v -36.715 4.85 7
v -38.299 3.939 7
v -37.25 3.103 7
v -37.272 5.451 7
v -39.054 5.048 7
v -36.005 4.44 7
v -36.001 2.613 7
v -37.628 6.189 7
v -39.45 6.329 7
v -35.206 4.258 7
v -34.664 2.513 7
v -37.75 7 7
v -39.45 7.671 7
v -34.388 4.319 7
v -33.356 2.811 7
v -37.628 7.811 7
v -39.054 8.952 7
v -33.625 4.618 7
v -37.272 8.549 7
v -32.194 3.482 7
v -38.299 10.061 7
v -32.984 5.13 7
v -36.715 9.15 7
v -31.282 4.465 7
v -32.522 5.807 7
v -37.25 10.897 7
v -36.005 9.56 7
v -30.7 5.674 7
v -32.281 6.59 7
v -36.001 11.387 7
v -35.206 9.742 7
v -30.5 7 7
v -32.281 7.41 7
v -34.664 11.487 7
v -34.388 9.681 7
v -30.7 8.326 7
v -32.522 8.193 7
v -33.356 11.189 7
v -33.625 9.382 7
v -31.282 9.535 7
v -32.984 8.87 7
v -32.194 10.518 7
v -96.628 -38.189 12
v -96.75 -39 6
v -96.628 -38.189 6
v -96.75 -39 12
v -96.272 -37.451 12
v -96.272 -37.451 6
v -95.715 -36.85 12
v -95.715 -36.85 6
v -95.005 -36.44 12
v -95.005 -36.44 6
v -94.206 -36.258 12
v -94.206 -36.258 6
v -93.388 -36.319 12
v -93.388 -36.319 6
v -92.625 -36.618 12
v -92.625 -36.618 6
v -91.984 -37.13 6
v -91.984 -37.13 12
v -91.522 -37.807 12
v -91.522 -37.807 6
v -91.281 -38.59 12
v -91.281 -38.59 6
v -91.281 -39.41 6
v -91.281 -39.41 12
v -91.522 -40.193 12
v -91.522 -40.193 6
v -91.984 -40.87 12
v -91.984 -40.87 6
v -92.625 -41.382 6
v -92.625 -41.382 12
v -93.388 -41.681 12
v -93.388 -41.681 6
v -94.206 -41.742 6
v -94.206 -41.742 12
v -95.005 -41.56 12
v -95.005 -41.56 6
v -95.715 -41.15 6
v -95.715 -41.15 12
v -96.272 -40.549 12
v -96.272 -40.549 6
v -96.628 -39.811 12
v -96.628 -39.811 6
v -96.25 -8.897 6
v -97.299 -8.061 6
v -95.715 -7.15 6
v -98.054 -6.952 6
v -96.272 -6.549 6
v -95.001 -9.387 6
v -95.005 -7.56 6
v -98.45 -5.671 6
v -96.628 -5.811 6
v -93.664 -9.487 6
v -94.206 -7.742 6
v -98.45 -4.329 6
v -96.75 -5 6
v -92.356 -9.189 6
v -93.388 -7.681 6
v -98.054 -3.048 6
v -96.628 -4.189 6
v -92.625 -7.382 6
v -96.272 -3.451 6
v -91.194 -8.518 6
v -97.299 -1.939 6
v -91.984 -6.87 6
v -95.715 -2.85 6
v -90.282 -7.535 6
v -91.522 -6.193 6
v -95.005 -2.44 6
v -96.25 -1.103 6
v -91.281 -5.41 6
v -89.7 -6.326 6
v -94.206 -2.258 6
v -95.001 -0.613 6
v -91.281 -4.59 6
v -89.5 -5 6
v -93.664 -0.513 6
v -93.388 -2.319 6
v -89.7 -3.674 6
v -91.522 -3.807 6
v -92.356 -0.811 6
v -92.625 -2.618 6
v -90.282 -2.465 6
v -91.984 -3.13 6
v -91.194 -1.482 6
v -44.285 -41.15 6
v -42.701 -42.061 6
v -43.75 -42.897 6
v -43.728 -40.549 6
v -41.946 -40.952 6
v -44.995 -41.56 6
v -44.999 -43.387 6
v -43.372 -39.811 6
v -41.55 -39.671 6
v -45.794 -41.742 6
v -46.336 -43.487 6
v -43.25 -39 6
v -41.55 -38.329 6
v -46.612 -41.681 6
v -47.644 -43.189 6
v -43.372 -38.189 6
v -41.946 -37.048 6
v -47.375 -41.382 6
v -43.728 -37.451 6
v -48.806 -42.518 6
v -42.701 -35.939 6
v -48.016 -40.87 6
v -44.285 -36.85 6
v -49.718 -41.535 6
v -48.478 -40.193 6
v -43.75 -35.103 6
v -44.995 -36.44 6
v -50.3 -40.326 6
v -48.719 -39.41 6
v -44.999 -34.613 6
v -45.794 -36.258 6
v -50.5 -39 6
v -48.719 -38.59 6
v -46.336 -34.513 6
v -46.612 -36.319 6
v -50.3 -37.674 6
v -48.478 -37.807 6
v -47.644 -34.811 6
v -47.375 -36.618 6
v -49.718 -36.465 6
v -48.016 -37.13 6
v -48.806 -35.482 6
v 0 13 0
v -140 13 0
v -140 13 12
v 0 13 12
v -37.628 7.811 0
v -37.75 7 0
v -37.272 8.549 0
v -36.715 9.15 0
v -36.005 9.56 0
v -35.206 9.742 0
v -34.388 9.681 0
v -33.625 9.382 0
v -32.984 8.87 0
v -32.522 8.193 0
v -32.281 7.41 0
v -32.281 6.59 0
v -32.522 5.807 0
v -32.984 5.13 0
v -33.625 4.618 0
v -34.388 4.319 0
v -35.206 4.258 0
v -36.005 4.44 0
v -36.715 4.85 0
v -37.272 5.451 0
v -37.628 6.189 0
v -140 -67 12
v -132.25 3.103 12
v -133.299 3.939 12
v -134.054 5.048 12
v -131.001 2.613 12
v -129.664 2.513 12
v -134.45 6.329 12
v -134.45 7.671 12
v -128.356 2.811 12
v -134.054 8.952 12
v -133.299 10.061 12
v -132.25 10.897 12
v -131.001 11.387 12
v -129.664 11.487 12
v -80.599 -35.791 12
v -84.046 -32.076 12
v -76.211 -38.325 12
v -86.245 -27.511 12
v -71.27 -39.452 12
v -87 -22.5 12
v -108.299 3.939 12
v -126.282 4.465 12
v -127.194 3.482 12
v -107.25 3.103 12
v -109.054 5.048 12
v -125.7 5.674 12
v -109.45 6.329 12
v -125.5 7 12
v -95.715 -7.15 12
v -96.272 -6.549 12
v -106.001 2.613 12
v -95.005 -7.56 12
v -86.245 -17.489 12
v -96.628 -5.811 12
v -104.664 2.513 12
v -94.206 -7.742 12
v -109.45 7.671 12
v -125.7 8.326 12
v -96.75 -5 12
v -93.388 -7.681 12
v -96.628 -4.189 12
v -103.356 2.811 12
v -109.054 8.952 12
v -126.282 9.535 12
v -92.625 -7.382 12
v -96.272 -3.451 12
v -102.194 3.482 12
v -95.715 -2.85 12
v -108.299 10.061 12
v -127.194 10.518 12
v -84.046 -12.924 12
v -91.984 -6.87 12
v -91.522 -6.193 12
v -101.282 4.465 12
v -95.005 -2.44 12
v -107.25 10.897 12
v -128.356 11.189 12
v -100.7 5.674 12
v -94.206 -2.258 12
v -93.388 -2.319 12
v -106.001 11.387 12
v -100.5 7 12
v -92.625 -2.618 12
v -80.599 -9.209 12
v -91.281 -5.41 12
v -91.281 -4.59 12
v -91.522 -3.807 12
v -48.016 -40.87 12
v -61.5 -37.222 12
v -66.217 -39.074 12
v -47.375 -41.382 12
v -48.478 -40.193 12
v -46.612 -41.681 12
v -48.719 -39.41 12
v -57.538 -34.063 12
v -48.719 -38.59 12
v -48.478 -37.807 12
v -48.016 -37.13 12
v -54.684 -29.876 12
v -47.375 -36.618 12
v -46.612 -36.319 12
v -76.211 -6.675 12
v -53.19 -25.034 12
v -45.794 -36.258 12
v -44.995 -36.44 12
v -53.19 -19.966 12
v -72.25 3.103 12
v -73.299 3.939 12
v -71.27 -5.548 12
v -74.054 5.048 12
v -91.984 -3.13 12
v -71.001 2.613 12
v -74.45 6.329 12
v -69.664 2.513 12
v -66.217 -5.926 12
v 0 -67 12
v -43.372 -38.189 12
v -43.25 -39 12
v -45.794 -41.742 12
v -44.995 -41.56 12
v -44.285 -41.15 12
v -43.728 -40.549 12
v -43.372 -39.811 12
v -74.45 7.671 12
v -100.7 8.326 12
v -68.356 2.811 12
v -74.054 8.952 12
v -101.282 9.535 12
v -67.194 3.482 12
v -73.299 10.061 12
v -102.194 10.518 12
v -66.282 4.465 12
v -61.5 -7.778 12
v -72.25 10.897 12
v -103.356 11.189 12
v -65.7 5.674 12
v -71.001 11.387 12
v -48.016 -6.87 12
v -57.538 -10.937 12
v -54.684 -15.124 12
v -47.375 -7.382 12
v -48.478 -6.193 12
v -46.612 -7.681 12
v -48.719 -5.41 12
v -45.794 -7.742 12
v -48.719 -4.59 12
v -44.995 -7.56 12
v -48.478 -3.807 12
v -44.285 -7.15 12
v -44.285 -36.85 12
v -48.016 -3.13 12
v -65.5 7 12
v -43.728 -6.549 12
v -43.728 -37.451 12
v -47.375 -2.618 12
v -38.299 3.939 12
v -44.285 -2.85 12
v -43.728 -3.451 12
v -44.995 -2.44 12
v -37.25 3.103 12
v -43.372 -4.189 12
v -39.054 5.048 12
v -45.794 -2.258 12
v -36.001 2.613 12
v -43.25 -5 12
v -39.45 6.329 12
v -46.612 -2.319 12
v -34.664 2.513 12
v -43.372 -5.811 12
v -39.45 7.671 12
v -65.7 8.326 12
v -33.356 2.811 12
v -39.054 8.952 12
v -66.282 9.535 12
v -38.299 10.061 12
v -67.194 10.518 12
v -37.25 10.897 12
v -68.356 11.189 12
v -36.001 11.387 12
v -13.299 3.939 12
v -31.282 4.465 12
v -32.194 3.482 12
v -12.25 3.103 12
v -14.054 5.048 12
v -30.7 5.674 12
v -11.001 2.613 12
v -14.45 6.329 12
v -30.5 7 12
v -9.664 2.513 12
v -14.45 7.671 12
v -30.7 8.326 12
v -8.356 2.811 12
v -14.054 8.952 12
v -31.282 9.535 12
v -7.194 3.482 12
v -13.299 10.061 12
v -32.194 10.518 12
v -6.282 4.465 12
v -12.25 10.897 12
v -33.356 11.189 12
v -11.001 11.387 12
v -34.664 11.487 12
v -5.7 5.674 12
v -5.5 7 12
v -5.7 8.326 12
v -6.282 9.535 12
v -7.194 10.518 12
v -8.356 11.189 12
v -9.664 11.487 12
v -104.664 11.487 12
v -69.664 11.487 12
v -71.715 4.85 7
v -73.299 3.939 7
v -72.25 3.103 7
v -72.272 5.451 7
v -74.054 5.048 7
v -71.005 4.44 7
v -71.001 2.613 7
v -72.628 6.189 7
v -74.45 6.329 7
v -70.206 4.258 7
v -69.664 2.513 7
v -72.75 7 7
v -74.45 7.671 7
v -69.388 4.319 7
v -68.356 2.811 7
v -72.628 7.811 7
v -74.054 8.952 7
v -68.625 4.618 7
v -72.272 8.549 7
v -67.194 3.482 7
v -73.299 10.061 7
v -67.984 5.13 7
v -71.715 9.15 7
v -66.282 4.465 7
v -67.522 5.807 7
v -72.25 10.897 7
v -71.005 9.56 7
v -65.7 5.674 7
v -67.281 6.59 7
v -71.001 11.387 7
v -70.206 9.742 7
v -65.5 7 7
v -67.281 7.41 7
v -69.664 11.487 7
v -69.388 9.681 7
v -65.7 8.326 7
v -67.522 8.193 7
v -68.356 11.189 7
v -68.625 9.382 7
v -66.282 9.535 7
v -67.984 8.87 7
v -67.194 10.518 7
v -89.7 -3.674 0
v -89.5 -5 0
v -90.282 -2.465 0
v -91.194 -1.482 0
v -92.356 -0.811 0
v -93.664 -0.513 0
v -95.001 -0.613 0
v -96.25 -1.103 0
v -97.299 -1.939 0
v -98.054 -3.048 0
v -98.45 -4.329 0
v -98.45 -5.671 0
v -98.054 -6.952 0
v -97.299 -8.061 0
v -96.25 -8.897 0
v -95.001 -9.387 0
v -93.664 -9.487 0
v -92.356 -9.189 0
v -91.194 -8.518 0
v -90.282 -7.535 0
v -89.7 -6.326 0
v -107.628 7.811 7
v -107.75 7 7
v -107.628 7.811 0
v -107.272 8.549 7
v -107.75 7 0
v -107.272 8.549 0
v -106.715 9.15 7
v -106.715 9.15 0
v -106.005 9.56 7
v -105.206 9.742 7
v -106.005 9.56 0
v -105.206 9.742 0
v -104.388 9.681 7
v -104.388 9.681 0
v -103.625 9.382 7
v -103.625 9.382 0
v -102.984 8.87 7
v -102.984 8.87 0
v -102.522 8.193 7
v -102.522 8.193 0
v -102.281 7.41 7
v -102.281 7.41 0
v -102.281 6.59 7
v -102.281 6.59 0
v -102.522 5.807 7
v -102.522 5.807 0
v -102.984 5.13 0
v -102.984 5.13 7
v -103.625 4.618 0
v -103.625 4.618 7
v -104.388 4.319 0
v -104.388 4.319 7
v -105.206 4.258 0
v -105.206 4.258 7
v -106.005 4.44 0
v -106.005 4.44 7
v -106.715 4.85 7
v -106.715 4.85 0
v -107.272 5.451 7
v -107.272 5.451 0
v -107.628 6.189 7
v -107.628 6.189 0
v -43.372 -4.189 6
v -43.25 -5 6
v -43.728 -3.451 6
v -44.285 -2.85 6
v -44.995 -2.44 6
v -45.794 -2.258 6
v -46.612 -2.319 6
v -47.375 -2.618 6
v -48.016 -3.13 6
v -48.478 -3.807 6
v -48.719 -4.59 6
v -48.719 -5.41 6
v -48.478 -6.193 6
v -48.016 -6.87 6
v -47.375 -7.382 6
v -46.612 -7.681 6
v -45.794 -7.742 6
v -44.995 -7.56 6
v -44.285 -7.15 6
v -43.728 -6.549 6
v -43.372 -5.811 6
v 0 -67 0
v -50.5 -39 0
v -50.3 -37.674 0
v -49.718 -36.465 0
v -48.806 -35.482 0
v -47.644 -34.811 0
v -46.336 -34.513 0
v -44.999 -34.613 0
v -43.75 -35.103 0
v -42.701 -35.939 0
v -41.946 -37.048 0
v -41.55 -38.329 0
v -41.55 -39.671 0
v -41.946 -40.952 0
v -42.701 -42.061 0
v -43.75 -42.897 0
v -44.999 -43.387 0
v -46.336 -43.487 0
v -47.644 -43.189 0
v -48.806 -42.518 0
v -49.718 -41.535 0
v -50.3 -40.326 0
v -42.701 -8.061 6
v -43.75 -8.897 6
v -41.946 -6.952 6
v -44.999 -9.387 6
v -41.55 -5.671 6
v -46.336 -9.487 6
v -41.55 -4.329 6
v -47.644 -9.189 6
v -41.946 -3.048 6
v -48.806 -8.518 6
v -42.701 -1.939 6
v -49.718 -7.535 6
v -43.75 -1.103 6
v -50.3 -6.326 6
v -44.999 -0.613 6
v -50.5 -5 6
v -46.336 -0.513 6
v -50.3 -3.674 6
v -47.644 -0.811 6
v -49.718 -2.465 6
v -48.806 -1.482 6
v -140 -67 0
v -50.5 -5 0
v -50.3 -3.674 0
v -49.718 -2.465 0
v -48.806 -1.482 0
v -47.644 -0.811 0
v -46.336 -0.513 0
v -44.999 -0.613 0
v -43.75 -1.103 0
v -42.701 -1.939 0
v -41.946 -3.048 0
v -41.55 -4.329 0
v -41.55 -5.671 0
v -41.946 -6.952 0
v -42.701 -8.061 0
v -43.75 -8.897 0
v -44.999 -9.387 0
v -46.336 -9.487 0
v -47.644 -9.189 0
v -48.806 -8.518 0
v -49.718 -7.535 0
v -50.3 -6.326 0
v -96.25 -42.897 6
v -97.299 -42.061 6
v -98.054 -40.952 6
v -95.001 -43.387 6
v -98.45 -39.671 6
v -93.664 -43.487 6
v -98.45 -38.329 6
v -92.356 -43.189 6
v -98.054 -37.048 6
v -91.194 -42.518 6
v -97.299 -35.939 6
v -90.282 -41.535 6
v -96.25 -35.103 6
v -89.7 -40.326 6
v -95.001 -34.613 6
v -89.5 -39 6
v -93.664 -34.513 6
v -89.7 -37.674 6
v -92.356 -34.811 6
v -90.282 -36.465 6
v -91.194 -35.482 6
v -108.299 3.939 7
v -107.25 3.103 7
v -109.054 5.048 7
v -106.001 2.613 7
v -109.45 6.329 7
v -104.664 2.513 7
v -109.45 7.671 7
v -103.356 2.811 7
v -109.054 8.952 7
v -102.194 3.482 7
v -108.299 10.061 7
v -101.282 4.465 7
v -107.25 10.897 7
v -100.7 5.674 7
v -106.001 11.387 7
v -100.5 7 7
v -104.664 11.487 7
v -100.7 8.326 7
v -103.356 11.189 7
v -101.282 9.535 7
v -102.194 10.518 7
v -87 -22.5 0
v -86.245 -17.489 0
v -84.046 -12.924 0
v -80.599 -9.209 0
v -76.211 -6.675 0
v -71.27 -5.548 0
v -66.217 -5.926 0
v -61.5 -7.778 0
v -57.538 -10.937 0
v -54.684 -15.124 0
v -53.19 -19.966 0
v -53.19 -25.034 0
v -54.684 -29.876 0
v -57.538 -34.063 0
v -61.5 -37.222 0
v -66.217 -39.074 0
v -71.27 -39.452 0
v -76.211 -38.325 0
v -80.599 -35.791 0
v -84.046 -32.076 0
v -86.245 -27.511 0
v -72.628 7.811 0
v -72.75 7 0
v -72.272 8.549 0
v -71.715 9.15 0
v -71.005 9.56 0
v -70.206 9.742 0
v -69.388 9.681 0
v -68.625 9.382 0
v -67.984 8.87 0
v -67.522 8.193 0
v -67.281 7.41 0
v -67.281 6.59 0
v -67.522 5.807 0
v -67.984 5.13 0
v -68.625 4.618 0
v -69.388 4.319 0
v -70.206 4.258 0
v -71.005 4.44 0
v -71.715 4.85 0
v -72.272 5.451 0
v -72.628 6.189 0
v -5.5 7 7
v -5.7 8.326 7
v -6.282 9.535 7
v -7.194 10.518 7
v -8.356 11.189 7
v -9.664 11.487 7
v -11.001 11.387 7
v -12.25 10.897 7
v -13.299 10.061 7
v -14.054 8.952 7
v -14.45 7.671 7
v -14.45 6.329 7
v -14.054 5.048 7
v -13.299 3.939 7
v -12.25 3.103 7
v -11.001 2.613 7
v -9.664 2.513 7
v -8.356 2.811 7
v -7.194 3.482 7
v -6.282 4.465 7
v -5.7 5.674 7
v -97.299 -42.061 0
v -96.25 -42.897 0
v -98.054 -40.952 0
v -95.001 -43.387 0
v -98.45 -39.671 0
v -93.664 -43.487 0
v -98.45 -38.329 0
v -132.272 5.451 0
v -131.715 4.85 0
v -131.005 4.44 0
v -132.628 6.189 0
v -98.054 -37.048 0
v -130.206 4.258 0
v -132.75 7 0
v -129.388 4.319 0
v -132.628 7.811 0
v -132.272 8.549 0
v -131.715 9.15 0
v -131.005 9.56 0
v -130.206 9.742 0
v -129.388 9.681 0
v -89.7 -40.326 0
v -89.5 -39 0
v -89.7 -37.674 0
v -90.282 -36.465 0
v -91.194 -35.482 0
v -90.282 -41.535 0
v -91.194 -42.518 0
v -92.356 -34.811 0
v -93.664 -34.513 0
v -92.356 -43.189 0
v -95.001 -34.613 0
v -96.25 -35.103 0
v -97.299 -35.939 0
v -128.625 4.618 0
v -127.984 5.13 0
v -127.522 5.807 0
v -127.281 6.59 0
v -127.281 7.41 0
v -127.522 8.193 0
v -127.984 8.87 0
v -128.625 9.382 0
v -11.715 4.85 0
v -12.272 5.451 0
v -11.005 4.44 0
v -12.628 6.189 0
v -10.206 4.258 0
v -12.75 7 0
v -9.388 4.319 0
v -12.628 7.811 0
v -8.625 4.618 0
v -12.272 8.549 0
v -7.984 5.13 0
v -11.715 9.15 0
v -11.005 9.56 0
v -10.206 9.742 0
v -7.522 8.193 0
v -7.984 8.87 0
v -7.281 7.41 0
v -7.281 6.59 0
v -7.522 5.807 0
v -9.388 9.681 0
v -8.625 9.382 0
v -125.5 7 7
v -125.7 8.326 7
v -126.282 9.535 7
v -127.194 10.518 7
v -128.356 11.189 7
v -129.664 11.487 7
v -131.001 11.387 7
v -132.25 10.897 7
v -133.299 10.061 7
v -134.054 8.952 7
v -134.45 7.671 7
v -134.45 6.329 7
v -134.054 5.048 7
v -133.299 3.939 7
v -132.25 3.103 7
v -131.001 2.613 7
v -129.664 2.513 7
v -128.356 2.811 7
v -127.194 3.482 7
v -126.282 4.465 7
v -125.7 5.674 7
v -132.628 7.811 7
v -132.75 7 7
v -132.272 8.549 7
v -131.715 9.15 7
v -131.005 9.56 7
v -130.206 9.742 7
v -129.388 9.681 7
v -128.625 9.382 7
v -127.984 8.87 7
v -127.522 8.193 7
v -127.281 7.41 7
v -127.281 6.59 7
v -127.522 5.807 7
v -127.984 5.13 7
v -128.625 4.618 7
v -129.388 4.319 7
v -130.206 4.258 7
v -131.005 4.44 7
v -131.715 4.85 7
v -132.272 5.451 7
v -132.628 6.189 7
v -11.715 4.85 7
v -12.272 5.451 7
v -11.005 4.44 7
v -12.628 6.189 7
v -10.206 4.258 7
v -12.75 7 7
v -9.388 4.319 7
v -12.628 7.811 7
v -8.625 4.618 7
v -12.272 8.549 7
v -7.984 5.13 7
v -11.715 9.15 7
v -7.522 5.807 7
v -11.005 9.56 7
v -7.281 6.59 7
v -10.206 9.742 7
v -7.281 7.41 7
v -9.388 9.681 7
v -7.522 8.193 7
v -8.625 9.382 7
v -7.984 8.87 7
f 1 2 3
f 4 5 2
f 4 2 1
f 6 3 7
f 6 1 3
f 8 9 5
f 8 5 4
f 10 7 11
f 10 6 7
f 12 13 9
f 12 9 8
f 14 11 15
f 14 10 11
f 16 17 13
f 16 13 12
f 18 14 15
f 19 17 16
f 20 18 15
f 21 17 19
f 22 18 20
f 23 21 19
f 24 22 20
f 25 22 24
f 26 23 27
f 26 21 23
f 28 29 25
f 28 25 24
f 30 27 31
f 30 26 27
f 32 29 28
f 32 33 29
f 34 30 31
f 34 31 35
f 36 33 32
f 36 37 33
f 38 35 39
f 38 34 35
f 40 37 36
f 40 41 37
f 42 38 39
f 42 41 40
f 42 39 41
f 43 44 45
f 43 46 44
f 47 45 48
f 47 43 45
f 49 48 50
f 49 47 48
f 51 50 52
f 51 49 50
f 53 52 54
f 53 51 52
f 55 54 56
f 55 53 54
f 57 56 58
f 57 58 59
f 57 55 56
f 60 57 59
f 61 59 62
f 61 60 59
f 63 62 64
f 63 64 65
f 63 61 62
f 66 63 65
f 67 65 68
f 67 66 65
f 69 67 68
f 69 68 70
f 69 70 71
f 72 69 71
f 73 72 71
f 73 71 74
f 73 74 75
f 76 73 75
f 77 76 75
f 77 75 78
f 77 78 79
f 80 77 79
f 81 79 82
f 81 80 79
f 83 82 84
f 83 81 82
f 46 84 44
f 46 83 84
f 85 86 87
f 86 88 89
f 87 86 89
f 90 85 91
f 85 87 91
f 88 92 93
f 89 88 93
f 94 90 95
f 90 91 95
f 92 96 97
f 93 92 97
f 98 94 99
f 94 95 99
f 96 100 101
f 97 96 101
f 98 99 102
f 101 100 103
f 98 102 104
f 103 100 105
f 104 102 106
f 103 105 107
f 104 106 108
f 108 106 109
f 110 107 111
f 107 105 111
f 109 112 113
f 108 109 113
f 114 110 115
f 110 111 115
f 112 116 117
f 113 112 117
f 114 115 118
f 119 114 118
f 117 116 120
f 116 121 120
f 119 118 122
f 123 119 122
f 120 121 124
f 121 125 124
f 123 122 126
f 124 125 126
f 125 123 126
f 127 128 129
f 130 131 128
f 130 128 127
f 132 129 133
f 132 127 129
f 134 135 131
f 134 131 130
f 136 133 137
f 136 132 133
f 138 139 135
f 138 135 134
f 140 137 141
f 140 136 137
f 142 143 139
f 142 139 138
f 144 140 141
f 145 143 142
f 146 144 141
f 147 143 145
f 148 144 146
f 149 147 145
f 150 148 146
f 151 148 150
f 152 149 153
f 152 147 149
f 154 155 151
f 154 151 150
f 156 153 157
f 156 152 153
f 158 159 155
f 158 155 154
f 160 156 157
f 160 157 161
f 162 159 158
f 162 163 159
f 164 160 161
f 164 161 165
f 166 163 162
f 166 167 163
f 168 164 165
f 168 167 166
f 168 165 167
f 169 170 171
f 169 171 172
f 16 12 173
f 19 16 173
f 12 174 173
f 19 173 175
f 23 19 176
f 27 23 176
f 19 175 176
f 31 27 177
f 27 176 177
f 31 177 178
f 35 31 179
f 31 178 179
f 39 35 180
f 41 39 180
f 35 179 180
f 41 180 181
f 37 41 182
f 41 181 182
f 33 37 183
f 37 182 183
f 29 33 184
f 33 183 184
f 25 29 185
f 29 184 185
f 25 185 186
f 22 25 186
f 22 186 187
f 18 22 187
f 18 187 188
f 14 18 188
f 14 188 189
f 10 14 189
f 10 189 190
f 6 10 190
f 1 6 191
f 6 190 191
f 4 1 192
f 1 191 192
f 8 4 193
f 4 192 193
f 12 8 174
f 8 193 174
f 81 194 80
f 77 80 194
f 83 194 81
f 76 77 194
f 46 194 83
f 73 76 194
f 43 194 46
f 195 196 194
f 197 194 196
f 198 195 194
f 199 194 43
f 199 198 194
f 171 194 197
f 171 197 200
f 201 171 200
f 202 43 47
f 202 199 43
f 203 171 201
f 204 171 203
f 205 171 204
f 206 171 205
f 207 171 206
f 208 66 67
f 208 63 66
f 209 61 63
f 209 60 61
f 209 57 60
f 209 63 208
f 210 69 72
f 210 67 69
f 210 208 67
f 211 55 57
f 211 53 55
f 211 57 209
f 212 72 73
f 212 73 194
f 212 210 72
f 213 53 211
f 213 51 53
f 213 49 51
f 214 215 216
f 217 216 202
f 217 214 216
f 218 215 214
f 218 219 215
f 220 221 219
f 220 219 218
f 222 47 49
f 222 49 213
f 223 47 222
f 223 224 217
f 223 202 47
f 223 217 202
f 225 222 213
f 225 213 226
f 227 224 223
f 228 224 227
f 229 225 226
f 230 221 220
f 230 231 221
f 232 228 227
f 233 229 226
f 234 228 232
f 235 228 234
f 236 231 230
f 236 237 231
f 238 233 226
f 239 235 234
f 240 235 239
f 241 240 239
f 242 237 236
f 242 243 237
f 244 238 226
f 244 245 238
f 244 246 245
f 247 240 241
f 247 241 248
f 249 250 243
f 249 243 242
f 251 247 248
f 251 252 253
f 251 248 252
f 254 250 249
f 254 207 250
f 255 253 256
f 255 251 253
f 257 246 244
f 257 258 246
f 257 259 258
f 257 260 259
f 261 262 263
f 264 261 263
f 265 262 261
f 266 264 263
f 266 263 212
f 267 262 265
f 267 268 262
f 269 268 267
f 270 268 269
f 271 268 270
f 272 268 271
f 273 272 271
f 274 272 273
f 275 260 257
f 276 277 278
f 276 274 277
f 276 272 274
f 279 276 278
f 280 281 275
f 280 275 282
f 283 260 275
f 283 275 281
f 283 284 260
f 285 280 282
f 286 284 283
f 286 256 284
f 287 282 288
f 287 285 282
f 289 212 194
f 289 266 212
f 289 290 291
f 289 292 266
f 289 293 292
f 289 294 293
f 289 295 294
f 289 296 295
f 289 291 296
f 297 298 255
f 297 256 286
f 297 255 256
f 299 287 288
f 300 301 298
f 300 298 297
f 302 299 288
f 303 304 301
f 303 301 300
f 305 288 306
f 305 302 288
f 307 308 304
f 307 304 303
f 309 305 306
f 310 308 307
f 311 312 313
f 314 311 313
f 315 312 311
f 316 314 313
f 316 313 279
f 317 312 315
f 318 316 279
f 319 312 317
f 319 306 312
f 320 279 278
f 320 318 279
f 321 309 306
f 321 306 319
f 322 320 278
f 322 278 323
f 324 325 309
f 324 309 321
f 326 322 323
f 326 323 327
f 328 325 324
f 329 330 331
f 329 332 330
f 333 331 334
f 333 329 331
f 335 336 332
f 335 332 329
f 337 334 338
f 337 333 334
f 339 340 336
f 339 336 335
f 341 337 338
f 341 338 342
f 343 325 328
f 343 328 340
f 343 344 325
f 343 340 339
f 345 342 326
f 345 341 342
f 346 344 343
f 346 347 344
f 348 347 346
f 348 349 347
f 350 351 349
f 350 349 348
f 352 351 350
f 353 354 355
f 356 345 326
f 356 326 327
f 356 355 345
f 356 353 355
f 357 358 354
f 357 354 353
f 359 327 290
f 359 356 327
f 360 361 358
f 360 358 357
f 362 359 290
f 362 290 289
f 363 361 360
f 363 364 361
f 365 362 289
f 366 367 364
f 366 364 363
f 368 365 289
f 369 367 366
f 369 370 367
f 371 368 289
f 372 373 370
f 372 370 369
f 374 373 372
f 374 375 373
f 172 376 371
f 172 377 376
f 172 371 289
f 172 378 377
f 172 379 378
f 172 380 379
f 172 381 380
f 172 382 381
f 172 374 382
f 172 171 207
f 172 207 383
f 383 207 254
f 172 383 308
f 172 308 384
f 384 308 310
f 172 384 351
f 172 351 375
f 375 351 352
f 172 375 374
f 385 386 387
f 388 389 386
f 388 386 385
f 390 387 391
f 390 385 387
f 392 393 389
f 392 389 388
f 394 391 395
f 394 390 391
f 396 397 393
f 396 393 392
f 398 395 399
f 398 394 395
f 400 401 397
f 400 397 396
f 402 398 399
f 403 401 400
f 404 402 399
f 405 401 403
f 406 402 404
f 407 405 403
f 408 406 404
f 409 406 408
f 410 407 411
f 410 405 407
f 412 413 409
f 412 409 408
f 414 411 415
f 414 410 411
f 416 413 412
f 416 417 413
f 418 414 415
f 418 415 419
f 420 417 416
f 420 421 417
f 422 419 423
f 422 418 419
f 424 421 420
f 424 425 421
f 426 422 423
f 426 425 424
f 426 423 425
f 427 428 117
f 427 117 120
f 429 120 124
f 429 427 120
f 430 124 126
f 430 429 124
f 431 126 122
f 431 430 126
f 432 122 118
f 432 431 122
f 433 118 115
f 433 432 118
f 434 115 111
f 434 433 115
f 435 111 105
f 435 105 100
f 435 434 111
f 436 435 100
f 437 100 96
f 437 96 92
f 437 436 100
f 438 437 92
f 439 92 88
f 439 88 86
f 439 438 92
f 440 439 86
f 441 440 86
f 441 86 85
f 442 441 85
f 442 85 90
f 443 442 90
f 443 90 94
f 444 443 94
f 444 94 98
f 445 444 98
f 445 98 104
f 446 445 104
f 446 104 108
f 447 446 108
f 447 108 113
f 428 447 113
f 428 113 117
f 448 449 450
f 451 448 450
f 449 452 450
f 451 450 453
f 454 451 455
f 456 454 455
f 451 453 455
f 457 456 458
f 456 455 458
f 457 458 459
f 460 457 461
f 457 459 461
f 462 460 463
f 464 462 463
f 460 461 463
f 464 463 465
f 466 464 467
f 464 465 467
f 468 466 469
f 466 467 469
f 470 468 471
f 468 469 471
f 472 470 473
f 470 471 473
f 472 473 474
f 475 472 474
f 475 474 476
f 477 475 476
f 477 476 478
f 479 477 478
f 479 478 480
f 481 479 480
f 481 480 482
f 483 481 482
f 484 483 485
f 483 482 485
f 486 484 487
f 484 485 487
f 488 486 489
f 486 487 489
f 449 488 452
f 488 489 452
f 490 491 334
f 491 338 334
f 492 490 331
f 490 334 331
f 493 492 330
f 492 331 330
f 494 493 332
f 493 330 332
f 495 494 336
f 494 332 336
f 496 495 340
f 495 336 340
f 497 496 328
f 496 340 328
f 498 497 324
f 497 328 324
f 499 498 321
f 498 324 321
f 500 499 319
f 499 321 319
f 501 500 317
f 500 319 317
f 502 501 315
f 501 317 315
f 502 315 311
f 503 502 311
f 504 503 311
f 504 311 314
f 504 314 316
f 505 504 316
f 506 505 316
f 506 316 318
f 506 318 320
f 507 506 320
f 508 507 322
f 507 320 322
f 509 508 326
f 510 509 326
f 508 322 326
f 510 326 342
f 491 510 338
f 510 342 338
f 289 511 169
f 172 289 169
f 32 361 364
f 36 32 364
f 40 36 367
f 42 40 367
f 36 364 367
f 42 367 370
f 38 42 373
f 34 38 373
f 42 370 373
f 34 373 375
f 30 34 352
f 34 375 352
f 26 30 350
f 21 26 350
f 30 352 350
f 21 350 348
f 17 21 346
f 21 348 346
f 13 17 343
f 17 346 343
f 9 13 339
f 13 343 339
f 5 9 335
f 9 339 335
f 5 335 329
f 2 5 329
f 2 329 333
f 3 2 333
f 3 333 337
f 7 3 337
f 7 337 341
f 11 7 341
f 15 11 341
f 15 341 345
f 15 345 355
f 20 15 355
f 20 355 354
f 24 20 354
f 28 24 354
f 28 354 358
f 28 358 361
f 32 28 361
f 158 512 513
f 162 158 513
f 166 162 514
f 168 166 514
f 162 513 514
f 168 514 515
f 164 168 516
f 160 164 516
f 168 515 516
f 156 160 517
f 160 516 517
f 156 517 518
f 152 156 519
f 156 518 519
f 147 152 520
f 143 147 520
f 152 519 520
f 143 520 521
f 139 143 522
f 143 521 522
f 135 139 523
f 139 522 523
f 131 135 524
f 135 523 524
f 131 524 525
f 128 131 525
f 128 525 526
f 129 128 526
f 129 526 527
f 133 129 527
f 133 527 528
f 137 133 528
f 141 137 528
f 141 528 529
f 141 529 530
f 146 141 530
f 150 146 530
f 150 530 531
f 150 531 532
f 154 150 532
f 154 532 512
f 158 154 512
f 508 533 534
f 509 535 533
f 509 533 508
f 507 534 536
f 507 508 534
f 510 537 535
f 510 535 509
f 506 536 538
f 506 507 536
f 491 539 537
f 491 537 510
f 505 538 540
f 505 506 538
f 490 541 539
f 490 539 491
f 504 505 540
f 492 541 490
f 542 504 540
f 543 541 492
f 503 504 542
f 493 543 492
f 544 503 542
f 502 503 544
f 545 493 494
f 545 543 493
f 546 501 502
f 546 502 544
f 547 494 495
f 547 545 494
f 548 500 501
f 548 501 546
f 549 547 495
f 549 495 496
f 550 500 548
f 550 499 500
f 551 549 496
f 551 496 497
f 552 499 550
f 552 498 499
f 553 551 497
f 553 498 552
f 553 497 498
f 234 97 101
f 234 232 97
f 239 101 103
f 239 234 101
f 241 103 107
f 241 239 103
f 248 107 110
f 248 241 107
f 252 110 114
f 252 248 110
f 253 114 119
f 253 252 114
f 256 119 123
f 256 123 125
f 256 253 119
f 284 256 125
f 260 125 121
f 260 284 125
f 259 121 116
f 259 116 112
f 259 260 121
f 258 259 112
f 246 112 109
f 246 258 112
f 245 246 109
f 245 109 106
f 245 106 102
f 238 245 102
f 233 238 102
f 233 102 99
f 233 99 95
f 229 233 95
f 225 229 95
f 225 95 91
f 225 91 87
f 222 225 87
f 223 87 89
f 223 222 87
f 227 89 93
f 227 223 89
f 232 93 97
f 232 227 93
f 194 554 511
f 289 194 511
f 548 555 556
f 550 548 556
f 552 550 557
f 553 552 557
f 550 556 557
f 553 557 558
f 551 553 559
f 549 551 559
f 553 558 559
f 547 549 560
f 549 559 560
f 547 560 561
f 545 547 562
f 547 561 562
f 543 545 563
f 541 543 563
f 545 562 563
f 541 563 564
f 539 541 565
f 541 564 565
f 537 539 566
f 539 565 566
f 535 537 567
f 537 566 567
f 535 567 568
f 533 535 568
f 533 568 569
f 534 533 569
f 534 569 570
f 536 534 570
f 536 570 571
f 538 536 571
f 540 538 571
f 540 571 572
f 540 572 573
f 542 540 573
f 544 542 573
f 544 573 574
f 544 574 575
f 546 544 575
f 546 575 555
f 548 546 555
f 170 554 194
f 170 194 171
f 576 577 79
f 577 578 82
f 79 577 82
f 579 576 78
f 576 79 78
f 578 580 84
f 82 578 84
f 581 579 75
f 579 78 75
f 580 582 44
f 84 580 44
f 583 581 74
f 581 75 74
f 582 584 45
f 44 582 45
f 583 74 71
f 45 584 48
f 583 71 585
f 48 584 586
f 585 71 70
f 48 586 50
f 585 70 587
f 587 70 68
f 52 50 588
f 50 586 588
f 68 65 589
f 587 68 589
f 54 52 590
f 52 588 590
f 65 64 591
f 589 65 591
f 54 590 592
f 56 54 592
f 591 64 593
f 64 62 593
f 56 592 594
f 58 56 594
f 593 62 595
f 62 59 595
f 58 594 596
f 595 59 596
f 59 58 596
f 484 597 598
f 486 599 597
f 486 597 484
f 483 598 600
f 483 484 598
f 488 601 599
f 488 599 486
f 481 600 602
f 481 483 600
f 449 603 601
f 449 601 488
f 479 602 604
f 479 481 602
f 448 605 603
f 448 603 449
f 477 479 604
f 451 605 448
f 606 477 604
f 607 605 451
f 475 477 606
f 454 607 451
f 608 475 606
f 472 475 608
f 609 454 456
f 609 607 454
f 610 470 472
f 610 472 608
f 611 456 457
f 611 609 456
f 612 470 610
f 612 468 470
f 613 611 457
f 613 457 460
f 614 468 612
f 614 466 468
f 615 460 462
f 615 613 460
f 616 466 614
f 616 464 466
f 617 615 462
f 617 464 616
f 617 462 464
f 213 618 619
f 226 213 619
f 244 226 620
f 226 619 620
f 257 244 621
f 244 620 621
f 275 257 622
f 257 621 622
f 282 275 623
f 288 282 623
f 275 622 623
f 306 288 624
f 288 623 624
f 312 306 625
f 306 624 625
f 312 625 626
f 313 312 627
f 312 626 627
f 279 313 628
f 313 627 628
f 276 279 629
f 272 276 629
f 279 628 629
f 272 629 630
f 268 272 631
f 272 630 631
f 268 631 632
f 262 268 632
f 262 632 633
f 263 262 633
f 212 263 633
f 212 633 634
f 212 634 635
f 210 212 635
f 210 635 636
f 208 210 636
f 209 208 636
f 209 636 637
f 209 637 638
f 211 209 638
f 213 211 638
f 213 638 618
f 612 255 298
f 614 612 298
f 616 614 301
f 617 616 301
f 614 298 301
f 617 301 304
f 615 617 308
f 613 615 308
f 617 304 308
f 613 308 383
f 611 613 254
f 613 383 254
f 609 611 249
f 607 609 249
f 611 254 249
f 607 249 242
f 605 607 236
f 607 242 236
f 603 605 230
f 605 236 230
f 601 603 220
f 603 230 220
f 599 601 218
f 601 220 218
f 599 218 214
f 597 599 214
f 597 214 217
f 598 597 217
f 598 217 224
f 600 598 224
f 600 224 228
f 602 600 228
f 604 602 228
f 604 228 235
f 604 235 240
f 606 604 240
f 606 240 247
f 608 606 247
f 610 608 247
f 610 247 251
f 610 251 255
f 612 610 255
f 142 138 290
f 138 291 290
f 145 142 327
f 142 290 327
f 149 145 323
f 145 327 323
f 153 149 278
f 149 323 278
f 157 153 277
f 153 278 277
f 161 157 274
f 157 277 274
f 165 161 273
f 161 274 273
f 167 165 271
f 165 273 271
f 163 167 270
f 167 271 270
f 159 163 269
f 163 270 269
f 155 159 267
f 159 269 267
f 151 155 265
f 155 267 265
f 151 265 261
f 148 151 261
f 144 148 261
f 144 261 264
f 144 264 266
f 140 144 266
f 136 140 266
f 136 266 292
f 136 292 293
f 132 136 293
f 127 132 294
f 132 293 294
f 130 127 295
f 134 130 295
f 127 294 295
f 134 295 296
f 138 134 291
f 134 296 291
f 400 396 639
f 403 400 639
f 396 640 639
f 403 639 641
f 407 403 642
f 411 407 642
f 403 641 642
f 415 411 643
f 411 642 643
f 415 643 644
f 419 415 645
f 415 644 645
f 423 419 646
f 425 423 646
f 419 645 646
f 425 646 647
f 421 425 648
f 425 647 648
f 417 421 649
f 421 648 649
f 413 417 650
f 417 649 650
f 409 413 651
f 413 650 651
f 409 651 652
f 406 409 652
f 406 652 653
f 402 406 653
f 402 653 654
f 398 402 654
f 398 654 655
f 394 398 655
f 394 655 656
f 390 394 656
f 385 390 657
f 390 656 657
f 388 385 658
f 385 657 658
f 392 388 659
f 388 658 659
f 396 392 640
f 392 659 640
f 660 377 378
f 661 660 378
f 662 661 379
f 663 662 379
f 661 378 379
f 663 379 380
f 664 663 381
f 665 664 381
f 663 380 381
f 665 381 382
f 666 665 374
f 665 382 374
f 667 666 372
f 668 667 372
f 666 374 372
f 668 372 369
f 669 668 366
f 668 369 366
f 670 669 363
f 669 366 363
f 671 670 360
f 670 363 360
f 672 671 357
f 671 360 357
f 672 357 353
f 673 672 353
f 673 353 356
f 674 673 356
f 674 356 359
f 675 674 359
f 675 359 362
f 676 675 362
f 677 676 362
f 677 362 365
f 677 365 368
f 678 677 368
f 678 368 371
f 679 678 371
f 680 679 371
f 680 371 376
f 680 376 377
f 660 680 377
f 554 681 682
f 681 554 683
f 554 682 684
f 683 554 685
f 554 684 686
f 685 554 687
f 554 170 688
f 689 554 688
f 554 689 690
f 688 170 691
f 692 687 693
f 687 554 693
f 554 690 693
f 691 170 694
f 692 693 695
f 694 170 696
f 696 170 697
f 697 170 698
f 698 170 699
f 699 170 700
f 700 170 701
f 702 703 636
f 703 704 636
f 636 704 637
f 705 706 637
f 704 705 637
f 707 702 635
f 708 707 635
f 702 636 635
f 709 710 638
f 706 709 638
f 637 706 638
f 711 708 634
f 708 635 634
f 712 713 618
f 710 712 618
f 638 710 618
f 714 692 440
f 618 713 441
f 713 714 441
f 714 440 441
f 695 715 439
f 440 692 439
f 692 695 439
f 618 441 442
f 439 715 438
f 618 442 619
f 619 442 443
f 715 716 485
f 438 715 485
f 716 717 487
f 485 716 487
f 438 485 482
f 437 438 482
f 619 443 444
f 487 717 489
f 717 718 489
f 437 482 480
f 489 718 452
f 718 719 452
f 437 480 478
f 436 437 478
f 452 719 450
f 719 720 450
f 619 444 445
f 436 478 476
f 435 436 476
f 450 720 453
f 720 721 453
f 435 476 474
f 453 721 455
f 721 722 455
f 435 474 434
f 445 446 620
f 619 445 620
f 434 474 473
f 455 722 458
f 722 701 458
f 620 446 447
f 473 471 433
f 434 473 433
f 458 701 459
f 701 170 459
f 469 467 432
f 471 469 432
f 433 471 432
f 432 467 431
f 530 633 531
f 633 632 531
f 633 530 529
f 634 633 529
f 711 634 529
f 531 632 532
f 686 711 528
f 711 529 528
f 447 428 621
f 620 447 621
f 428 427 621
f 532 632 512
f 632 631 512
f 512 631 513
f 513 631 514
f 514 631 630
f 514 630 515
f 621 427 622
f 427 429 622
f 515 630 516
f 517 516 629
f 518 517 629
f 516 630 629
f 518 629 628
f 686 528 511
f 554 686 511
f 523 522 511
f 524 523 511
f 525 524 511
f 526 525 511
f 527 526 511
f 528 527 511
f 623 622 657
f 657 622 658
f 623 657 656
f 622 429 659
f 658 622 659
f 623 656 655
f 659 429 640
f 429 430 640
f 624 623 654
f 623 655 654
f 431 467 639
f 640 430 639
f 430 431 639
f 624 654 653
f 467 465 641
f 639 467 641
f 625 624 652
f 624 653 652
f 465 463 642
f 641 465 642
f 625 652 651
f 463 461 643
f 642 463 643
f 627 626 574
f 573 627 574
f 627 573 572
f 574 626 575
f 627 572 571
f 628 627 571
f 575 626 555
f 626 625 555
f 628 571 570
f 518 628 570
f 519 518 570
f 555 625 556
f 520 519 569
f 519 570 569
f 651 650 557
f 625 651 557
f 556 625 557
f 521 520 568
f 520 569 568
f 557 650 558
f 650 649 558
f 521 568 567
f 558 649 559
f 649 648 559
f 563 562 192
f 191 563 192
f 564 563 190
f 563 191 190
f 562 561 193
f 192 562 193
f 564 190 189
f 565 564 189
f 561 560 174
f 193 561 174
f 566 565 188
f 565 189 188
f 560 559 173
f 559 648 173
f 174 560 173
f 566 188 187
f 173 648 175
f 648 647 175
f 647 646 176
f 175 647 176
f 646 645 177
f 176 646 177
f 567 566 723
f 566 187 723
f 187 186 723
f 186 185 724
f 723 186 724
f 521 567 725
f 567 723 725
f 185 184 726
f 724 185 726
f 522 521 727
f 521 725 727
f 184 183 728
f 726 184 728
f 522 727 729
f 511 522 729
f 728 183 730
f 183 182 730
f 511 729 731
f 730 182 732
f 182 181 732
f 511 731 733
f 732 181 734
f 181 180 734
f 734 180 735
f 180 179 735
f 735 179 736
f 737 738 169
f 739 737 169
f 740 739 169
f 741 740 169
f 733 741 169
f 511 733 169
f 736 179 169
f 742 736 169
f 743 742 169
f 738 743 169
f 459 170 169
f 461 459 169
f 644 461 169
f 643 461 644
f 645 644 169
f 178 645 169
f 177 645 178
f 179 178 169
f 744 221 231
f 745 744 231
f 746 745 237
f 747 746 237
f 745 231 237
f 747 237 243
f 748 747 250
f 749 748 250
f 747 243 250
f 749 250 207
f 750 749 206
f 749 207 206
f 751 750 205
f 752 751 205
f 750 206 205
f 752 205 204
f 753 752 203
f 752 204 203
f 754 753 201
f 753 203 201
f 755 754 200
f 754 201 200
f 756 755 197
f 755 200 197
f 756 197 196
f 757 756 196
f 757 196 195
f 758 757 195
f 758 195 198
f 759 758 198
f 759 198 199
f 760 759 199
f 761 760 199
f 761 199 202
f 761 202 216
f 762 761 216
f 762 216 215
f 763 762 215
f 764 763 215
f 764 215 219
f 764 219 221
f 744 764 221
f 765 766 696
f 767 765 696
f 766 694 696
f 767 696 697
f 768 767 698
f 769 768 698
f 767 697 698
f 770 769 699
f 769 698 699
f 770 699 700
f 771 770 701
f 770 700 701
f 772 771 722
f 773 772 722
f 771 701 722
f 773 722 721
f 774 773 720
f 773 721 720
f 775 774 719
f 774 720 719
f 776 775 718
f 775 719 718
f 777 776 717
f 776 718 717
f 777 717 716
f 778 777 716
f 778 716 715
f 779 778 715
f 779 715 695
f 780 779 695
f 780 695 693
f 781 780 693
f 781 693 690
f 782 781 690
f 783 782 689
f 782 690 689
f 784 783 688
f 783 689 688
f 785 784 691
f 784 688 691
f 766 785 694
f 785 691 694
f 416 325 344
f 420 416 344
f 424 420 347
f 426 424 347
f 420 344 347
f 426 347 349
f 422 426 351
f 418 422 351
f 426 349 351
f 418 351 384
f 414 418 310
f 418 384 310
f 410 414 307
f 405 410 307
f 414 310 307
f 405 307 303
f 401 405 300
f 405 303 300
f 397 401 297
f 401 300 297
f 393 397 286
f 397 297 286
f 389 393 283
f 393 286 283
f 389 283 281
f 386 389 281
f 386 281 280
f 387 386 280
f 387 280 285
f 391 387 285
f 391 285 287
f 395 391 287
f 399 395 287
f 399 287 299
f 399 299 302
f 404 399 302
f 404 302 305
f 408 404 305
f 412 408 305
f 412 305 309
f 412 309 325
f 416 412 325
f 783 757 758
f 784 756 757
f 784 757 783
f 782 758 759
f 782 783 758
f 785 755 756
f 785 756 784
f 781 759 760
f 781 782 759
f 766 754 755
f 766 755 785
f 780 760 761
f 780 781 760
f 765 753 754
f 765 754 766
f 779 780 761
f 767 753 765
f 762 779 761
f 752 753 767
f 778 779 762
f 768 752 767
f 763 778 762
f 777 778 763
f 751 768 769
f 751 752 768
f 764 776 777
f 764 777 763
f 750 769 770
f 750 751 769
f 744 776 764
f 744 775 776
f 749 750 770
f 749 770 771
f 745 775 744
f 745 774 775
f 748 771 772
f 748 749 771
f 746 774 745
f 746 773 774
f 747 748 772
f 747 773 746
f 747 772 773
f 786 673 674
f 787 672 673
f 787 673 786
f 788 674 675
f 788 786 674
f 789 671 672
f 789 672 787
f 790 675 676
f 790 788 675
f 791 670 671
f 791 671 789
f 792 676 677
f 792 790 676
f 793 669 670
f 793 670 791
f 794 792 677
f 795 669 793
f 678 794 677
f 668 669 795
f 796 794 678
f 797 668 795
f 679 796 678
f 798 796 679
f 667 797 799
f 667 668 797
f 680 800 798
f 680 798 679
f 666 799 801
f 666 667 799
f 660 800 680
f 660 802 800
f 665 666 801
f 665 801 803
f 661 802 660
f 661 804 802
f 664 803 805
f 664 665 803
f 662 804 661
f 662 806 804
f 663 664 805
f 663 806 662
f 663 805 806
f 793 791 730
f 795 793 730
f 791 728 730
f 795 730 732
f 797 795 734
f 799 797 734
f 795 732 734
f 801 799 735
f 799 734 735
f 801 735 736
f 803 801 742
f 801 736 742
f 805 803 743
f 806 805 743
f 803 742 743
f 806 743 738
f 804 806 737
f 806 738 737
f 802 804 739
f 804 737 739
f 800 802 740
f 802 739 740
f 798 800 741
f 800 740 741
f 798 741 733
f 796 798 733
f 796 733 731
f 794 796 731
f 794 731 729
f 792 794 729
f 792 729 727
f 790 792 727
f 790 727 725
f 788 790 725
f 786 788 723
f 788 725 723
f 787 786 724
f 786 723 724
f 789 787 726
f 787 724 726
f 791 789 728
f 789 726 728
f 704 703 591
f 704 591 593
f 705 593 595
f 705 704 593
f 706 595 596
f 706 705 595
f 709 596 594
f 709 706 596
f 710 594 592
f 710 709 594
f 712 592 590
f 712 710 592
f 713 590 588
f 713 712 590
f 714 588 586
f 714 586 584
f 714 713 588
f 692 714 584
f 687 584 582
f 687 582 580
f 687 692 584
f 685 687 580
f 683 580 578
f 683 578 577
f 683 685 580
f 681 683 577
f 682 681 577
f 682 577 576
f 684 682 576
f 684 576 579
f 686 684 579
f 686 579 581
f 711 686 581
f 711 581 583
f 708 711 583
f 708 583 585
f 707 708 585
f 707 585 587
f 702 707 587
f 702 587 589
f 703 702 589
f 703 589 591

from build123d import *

# Parameters (mm, degrees)
SZKIC1_W                                             = 140
SZKIC1_H                                             = 80
DODANIE_WYCI_GNI_CIE1_DEPTH                          = 12
POG_BIENIE_WALCOWE_POD_M5_WKR_T_DO_CZ_CI_D           = 5.5
POG_BIENIE_WALCOWE_POD_M5_WKR_T_DO_CZ_CI_CBORE_D     = 9
POG_BIENIE_WALCOWE_POD_M5_WKR_T_DO_CZ_CI_CBORE_DEPTH = 5
SZKIC4_R                                             = 17
WYTNIJ_WYCI_GNI_CIE1_DEPTH                           = 156.669521744
POG_BIENIE_WALCOWE_POD_M5_WKR_T_DO_C_2_D             = 5.5
POG_BIENIE_WALCOWE_POD_M5_WKR_T_DO_C_2_CBORE_D       = 9
POG_BIENIE_WALCOWE_POD_M5_WKR_T_DO_C_2_CBORE_DEPTH   = 6


with BuildPart() as part:
    # Szkic1 → Dodanie-wyciągnięcie1 (new body)
    with BuildSketch(Plane.XY):
        with Locations((-70, -27)):
            Rectangle(SZKIC1_W, SZKIC1_H)
    extrude(amount=DODANIE_WYCI_GNI_CIE1_DEPTH)

    # Pog_bienie walcowe pod M5 Wkr_t do cz_ci (through all)
    with Locations(Plane.XY.offset(12)):
        with Locations((-10, 7), (-35, 7), (-105, 7), (-130, 7), (-70, 7)):
            CounterBoreHole(POG_BIENIE_WALCOWE_POD_M5_WKR_T_DO_CZ_CI_D / 2, POG_BIENIE_WALCOWE_POD_M5_WKR_T_DO_CZ_CI_CBORE_D / 2, POG_BIENIE_WALCOWE_POD_M5_WKR_T_DO_CZ_CI_CBORE_DEPTH)

    # Szkic4 → Wytnij-wyciągnięcie1 (cut, through all)
    with BuildSketch(Plane(origin=(0, 0, 0), x_dir=(-1, 0, 0), z_dir=(0, 0, -1))):
        with Locations((70, -22.5)):
            Circle(SZKIC4_R)
    extrude(amount=-WYTNIJ_WYCI_GNI_CIE1_DEPTH, mode=Mode.SUBTRACT)

    # Pog_bienie walcowe pod M5 Wkr_t do c 2 (through all)
    with Locations(Plane(origin=(0, 0, 0), x_dir=(-1, 0, 0), z_dir=(0, 0, -1))):
        with Locations((46, -39), (46, -5)):
            pog_bienie_walcowe_pod_m5_wkr_t_do_c_2 = CounterBoreHole(POG_BIENIE_WALCOWE_POD_M5_WKR_T_DO_C_2_D / 2, POG_BIENIE_WALCOWE_POD_M5_WKR_T_DO_C_2_CBORE_D / 2, POG_BIENIE_WALCOWE_POD_M5_WKR_T_DO_C_2_CBORE_DEPTH)

    # Lustro1: Pog_bienie walcowe pod M5 Wkr_t do c 2 across plane
    add(pog_bienie_walcowe_pod_m5_wkr_t_do_c_2.mirror(Plane.ZY.offset(70)), mode=Mode.SUBTRACT)


solid = part.part
